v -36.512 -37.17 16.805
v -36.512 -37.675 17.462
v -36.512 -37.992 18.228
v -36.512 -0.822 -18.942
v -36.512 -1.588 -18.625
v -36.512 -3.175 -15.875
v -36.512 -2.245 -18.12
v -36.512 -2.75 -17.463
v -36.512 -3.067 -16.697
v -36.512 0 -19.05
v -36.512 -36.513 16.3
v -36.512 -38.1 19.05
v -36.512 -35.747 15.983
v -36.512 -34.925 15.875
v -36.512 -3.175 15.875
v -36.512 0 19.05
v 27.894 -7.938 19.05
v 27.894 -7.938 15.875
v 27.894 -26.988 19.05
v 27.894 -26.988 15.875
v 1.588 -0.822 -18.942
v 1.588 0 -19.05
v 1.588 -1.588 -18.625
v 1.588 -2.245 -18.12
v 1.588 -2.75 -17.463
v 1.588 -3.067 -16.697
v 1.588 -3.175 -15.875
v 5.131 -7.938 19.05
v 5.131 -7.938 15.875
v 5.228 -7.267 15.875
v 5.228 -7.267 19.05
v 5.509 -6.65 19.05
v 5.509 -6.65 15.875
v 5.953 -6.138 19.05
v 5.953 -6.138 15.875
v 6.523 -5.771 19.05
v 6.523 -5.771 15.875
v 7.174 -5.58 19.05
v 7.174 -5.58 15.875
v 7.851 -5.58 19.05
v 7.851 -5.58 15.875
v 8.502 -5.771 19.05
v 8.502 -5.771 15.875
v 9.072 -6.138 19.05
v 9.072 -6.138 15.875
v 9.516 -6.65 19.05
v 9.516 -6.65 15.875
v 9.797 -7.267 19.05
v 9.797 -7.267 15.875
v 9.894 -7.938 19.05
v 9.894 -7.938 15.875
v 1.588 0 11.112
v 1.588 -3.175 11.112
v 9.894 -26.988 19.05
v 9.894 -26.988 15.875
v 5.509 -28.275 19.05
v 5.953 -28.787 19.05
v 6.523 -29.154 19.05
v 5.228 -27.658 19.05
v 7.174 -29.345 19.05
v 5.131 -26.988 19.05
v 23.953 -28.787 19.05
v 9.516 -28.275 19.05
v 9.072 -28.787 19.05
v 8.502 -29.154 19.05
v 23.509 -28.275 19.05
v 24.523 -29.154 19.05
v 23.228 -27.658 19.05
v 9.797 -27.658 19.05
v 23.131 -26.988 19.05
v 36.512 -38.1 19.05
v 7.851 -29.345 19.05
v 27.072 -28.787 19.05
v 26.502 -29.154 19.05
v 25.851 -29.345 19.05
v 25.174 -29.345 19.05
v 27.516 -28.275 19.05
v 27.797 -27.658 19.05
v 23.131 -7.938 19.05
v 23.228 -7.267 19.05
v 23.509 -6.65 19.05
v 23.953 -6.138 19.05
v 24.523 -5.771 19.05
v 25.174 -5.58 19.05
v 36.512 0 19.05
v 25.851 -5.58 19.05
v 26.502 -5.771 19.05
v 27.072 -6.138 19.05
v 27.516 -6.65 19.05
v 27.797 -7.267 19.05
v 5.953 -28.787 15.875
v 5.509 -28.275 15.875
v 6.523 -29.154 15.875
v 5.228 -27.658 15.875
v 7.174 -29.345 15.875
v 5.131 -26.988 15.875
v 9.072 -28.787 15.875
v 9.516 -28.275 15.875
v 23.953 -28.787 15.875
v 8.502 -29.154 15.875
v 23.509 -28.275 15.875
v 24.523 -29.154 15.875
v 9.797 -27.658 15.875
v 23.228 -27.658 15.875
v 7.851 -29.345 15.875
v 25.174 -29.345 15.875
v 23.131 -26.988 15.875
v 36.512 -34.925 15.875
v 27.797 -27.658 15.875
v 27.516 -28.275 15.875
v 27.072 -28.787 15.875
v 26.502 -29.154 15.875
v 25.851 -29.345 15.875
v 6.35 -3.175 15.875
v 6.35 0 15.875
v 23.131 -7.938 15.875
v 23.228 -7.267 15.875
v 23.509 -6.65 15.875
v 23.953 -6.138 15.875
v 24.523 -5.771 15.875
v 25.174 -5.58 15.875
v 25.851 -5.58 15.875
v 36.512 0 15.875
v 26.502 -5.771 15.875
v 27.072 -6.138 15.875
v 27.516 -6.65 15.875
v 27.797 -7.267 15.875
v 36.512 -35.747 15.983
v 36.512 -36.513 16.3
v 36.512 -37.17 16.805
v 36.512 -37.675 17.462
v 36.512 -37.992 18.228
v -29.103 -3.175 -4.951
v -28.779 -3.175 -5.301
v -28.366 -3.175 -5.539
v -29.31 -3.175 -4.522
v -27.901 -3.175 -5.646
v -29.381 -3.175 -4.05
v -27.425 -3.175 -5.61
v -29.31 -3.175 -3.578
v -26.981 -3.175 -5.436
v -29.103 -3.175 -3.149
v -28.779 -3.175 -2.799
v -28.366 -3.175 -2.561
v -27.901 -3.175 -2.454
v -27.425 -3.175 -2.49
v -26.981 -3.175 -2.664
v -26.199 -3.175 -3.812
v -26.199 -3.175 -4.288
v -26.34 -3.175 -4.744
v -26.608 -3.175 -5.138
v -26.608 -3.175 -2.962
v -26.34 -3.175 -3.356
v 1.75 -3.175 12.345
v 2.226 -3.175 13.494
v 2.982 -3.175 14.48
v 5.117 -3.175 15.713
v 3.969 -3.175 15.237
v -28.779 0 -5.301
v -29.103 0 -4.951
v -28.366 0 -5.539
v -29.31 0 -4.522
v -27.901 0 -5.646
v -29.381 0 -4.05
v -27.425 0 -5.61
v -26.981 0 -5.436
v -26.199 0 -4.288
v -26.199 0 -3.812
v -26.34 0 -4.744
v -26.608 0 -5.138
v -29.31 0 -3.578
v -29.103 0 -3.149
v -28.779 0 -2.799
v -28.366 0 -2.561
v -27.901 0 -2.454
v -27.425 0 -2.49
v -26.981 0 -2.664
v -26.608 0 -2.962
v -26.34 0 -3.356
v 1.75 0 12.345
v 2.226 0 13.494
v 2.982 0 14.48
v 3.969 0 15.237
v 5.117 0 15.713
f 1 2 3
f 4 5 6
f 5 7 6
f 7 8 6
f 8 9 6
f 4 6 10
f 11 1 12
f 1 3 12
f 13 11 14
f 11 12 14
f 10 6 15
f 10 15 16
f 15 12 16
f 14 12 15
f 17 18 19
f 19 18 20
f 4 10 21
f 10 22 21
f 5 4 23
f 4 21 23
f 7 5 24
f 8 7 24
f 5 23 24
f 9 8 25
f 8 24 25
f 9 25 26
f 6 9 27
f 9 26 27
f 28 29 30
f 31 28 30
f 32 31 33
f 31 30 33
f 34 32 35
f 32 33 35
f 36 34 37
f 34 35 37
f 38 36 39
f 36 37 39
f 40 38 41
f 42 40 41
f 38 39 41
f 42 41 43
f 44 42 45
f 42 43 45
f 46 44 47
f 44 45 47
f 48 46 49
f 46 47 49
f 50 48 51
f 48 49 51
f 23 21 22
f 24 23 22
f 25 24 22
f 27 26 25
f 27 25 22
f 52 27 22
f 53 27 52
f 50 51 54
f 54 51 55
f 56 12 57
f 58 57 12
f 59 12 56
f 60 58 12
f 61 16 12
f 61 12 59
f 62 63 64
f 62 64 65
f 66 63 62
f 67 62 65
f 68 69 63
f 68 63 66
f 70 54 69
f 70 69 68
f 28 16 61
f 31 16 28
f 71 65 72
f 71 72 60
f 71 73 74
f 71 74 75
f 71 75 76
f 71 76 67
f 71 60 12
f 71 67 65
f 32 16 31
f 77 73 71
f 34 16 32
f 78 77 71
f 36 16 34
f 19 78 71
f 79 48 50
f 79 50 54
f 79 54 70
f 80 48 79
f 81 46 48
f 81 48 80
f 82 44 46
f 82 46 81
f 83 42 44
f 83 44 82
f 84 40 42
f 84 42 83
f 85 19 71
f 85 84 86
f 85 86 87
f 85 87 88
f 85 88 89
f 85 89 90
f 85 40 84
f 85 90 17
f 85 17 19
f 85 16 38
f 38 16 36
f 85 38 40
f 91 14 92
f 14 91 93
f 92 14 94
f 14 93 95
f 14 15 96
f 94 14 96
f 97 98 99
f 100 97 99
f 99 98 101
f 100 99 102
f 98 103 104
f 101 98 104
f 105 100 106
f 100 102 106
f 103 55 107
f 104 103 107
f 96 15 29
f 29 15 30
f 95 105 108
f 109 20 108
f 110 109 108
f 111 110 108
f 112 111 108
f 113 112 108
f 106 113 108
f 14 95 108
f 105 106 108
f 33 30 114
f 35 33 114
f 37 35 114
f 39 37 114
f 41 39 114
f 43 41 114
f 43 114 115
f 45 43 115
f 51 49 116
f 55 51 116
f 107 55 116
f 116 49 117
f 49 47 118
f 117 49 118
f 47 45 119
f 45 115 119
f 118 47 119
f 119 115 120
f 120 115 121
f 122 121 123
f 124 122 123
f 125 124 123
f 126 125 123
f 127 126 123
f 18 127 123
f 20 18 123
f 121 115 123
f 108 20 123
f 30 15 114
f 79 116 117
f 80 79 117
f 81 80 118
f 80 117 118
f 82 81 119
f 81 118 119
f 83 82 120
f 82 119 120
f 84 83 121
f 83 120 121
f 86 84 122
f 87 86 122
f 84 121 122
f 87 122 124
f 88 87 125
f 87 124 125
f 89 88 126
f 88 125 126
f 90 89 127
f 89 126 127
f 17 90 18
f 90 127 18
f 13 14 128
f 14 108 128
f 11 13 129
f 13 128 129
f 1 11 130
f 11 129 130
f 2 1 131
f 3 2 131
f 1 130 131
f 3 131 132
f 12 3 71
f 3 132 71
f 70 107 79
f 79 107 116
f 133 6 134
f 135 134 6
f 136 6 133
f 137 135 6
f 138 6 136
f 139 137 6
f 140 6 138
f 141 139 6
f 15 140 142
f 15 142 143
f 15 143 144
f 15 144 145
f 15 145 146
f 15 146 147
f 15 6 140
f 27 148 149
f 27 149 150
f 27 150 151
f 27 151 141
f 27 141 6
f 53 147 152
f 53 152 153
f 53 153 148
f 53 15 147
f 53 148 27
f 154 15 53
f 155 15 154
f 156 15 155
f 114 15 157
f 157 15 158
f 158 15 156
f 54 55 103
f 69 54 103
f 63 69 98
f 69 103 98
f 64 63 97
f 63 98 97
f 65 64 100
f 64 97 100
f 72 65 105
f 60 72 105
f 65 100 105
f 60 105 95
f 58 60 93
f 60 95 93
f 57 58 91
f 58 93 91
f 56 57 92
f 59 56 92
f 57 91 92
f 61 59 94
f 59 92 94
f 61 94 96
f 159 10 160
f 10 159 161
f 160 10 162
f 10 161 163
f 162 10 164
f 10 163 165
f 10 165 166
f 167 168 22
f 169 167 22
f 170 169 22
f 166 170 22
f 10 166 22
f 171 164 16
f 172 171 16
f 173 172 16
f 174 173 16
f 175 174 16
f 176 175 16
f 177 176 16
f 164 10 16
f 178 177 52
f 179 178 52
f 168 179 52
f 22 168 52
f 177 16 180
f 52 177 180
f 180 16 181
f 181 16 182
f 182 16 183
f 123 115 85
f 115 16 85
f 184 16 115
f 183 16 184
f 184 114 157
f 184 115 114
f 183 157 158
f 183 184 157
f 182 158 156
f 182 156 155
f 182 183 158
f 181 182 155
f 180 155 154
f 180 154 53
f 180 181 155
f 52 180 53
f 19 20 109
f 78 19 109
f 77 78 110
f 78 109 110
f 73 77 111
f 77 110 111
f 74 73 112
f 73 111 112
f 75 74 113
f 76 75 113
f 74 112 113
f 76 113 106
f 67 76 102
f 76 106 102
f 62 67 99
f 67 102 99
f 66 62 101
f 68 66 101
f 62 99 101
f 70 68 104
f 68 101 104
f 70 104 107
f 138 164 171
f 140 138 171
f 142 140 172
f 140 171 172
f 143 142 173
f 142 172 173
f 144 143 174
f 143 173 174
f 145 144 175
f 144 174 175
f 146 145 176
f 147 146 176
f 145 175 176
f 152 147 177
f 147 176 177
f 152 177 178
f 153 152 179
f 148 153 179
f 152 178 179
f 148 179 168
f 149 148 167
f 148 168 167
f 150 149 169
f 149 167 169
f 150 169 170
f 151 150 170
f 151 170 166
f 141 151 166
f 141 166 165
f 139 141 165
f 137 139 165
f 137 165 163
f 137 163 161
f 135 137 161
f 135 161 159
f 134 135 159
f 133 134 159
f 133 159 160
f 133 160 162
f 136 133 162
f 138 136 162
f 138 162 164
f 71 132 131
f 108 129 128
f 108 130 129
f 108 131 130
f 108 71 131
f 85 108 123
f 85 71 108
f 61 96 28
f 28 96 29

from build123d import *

# Parameters (mm, degrees)
F0_W     = 73.025
F0_H     = 38.1
F1_DEPTH = 3.175
F2_W     = 73.025
F2_H     = 34.925
F3_DEPTH = 3.175
F5_D     = 3.2
F5_DEPTH = 34.925
F5_TIP   = 0.9613769904
F7_DEPTH = 3.176
F8_W     = 34.925
F8_H     = 34.925
F9_DEPTH = 3.176
F10_R    = 3.17499
F11_R    = 4.7625


# Not quite as in the source:
# - a fillet or chamfer is up to 0.001 mm smaller than in the source, because OpenCascade refuses the exact size


with BuildPart() as f1:
    # F0 (on Front) → F1 (new body)
    with BuildSketch(Plane.XZ):
        Rectangle(F0_W, F0_H)
    extrude(amount=F1_DEPTH)

    # F2 (on face) → F3 (join)
    with BuildSketch(Plane.XY.offset(19.05)):
        with Locations((0, -20.6375)):
            Rectangle(F2_W, F2_H)
    extrude(amount=-F3_DEPTH)

    # F5
    with Locations(Plane.XZ.offset(3.175)):
        with Locations((-27.78125, -4.05)):
            Hole(F5_D / 2, depth=F5_DEPTH)
            with Locations((0, 0, -(F5_DEPTH + F5_TIP / 2))):  # 118° drill point
                Cone(0, F5_D / 2, F5_TIP, mode=Mode.SUBTRACT)

    # F6 (on face) → F7 (cut, through all)
    with BuildSketch(Plane(origin=(0, 0, 15.875), x_dir=(1, 0, 0), z_dir=(0, 0, -1))):
        with BuildLine():
            ThreePointArc((5.13125, 7.9375), (7.5125, 5.55625), (9.89375, 7.9375))
            Line((9.89375, 7.9375), (9.89375, 26.9875))
            ThreePointArc((9.89375, 26.9875), (7.5125, 29.36875), (5.13125, 26.9875))
            Line((5.13125, 26.9875), (5.13125, 7.9375))
        make_face()
        with BuildLine():
            ThreePointArc((23.13125, 7.9375), (25.5125, 5.55625), (27.89375, 7.9375))
            Line((27.89375, 7.9375), (27.89375, 26.9875))
            ThreePointArc((27.89375, 26.9875), (25.5125, 29.36875), (23.13125, 26.9875))
            Line((23.13125, 26.9875), (23.13125, 7.9375))
        make_face()
    extrude(amount=-F7_DEPTH, mode=Mode.SUBTRACT)

    # F8 (on face) → F9 (cut, through all)
    with BuildSketch(Plane.XZ.offset(3.175)):
        with Locations((19.05, -1.5875)):
            Rectangle(F8_W, F8_H)
    extrude(amount=-F9_DEPTH, mode=Mode.SUBTRACT)

    # F10 (radius 3.175 in the source; OpenCascade refuses exactly that, so slightly less here)
    f10_edges = [f1.edges().sort_by_distance(p)[0] for p in [
        (0, -38.1, 15.875),
        (-17.4625, -3.175, -19.05),
    ]]
    fillet(f10_edges, radius=F10_R)

    # F11
    f11_edges = [f1.edges().sort_by_distance(p)[0] for p in [
        (1.5875, -1.5875, 15.875),
    ]]
    fillet(f11_edges, radius=F11_R)


solid = f1.part
